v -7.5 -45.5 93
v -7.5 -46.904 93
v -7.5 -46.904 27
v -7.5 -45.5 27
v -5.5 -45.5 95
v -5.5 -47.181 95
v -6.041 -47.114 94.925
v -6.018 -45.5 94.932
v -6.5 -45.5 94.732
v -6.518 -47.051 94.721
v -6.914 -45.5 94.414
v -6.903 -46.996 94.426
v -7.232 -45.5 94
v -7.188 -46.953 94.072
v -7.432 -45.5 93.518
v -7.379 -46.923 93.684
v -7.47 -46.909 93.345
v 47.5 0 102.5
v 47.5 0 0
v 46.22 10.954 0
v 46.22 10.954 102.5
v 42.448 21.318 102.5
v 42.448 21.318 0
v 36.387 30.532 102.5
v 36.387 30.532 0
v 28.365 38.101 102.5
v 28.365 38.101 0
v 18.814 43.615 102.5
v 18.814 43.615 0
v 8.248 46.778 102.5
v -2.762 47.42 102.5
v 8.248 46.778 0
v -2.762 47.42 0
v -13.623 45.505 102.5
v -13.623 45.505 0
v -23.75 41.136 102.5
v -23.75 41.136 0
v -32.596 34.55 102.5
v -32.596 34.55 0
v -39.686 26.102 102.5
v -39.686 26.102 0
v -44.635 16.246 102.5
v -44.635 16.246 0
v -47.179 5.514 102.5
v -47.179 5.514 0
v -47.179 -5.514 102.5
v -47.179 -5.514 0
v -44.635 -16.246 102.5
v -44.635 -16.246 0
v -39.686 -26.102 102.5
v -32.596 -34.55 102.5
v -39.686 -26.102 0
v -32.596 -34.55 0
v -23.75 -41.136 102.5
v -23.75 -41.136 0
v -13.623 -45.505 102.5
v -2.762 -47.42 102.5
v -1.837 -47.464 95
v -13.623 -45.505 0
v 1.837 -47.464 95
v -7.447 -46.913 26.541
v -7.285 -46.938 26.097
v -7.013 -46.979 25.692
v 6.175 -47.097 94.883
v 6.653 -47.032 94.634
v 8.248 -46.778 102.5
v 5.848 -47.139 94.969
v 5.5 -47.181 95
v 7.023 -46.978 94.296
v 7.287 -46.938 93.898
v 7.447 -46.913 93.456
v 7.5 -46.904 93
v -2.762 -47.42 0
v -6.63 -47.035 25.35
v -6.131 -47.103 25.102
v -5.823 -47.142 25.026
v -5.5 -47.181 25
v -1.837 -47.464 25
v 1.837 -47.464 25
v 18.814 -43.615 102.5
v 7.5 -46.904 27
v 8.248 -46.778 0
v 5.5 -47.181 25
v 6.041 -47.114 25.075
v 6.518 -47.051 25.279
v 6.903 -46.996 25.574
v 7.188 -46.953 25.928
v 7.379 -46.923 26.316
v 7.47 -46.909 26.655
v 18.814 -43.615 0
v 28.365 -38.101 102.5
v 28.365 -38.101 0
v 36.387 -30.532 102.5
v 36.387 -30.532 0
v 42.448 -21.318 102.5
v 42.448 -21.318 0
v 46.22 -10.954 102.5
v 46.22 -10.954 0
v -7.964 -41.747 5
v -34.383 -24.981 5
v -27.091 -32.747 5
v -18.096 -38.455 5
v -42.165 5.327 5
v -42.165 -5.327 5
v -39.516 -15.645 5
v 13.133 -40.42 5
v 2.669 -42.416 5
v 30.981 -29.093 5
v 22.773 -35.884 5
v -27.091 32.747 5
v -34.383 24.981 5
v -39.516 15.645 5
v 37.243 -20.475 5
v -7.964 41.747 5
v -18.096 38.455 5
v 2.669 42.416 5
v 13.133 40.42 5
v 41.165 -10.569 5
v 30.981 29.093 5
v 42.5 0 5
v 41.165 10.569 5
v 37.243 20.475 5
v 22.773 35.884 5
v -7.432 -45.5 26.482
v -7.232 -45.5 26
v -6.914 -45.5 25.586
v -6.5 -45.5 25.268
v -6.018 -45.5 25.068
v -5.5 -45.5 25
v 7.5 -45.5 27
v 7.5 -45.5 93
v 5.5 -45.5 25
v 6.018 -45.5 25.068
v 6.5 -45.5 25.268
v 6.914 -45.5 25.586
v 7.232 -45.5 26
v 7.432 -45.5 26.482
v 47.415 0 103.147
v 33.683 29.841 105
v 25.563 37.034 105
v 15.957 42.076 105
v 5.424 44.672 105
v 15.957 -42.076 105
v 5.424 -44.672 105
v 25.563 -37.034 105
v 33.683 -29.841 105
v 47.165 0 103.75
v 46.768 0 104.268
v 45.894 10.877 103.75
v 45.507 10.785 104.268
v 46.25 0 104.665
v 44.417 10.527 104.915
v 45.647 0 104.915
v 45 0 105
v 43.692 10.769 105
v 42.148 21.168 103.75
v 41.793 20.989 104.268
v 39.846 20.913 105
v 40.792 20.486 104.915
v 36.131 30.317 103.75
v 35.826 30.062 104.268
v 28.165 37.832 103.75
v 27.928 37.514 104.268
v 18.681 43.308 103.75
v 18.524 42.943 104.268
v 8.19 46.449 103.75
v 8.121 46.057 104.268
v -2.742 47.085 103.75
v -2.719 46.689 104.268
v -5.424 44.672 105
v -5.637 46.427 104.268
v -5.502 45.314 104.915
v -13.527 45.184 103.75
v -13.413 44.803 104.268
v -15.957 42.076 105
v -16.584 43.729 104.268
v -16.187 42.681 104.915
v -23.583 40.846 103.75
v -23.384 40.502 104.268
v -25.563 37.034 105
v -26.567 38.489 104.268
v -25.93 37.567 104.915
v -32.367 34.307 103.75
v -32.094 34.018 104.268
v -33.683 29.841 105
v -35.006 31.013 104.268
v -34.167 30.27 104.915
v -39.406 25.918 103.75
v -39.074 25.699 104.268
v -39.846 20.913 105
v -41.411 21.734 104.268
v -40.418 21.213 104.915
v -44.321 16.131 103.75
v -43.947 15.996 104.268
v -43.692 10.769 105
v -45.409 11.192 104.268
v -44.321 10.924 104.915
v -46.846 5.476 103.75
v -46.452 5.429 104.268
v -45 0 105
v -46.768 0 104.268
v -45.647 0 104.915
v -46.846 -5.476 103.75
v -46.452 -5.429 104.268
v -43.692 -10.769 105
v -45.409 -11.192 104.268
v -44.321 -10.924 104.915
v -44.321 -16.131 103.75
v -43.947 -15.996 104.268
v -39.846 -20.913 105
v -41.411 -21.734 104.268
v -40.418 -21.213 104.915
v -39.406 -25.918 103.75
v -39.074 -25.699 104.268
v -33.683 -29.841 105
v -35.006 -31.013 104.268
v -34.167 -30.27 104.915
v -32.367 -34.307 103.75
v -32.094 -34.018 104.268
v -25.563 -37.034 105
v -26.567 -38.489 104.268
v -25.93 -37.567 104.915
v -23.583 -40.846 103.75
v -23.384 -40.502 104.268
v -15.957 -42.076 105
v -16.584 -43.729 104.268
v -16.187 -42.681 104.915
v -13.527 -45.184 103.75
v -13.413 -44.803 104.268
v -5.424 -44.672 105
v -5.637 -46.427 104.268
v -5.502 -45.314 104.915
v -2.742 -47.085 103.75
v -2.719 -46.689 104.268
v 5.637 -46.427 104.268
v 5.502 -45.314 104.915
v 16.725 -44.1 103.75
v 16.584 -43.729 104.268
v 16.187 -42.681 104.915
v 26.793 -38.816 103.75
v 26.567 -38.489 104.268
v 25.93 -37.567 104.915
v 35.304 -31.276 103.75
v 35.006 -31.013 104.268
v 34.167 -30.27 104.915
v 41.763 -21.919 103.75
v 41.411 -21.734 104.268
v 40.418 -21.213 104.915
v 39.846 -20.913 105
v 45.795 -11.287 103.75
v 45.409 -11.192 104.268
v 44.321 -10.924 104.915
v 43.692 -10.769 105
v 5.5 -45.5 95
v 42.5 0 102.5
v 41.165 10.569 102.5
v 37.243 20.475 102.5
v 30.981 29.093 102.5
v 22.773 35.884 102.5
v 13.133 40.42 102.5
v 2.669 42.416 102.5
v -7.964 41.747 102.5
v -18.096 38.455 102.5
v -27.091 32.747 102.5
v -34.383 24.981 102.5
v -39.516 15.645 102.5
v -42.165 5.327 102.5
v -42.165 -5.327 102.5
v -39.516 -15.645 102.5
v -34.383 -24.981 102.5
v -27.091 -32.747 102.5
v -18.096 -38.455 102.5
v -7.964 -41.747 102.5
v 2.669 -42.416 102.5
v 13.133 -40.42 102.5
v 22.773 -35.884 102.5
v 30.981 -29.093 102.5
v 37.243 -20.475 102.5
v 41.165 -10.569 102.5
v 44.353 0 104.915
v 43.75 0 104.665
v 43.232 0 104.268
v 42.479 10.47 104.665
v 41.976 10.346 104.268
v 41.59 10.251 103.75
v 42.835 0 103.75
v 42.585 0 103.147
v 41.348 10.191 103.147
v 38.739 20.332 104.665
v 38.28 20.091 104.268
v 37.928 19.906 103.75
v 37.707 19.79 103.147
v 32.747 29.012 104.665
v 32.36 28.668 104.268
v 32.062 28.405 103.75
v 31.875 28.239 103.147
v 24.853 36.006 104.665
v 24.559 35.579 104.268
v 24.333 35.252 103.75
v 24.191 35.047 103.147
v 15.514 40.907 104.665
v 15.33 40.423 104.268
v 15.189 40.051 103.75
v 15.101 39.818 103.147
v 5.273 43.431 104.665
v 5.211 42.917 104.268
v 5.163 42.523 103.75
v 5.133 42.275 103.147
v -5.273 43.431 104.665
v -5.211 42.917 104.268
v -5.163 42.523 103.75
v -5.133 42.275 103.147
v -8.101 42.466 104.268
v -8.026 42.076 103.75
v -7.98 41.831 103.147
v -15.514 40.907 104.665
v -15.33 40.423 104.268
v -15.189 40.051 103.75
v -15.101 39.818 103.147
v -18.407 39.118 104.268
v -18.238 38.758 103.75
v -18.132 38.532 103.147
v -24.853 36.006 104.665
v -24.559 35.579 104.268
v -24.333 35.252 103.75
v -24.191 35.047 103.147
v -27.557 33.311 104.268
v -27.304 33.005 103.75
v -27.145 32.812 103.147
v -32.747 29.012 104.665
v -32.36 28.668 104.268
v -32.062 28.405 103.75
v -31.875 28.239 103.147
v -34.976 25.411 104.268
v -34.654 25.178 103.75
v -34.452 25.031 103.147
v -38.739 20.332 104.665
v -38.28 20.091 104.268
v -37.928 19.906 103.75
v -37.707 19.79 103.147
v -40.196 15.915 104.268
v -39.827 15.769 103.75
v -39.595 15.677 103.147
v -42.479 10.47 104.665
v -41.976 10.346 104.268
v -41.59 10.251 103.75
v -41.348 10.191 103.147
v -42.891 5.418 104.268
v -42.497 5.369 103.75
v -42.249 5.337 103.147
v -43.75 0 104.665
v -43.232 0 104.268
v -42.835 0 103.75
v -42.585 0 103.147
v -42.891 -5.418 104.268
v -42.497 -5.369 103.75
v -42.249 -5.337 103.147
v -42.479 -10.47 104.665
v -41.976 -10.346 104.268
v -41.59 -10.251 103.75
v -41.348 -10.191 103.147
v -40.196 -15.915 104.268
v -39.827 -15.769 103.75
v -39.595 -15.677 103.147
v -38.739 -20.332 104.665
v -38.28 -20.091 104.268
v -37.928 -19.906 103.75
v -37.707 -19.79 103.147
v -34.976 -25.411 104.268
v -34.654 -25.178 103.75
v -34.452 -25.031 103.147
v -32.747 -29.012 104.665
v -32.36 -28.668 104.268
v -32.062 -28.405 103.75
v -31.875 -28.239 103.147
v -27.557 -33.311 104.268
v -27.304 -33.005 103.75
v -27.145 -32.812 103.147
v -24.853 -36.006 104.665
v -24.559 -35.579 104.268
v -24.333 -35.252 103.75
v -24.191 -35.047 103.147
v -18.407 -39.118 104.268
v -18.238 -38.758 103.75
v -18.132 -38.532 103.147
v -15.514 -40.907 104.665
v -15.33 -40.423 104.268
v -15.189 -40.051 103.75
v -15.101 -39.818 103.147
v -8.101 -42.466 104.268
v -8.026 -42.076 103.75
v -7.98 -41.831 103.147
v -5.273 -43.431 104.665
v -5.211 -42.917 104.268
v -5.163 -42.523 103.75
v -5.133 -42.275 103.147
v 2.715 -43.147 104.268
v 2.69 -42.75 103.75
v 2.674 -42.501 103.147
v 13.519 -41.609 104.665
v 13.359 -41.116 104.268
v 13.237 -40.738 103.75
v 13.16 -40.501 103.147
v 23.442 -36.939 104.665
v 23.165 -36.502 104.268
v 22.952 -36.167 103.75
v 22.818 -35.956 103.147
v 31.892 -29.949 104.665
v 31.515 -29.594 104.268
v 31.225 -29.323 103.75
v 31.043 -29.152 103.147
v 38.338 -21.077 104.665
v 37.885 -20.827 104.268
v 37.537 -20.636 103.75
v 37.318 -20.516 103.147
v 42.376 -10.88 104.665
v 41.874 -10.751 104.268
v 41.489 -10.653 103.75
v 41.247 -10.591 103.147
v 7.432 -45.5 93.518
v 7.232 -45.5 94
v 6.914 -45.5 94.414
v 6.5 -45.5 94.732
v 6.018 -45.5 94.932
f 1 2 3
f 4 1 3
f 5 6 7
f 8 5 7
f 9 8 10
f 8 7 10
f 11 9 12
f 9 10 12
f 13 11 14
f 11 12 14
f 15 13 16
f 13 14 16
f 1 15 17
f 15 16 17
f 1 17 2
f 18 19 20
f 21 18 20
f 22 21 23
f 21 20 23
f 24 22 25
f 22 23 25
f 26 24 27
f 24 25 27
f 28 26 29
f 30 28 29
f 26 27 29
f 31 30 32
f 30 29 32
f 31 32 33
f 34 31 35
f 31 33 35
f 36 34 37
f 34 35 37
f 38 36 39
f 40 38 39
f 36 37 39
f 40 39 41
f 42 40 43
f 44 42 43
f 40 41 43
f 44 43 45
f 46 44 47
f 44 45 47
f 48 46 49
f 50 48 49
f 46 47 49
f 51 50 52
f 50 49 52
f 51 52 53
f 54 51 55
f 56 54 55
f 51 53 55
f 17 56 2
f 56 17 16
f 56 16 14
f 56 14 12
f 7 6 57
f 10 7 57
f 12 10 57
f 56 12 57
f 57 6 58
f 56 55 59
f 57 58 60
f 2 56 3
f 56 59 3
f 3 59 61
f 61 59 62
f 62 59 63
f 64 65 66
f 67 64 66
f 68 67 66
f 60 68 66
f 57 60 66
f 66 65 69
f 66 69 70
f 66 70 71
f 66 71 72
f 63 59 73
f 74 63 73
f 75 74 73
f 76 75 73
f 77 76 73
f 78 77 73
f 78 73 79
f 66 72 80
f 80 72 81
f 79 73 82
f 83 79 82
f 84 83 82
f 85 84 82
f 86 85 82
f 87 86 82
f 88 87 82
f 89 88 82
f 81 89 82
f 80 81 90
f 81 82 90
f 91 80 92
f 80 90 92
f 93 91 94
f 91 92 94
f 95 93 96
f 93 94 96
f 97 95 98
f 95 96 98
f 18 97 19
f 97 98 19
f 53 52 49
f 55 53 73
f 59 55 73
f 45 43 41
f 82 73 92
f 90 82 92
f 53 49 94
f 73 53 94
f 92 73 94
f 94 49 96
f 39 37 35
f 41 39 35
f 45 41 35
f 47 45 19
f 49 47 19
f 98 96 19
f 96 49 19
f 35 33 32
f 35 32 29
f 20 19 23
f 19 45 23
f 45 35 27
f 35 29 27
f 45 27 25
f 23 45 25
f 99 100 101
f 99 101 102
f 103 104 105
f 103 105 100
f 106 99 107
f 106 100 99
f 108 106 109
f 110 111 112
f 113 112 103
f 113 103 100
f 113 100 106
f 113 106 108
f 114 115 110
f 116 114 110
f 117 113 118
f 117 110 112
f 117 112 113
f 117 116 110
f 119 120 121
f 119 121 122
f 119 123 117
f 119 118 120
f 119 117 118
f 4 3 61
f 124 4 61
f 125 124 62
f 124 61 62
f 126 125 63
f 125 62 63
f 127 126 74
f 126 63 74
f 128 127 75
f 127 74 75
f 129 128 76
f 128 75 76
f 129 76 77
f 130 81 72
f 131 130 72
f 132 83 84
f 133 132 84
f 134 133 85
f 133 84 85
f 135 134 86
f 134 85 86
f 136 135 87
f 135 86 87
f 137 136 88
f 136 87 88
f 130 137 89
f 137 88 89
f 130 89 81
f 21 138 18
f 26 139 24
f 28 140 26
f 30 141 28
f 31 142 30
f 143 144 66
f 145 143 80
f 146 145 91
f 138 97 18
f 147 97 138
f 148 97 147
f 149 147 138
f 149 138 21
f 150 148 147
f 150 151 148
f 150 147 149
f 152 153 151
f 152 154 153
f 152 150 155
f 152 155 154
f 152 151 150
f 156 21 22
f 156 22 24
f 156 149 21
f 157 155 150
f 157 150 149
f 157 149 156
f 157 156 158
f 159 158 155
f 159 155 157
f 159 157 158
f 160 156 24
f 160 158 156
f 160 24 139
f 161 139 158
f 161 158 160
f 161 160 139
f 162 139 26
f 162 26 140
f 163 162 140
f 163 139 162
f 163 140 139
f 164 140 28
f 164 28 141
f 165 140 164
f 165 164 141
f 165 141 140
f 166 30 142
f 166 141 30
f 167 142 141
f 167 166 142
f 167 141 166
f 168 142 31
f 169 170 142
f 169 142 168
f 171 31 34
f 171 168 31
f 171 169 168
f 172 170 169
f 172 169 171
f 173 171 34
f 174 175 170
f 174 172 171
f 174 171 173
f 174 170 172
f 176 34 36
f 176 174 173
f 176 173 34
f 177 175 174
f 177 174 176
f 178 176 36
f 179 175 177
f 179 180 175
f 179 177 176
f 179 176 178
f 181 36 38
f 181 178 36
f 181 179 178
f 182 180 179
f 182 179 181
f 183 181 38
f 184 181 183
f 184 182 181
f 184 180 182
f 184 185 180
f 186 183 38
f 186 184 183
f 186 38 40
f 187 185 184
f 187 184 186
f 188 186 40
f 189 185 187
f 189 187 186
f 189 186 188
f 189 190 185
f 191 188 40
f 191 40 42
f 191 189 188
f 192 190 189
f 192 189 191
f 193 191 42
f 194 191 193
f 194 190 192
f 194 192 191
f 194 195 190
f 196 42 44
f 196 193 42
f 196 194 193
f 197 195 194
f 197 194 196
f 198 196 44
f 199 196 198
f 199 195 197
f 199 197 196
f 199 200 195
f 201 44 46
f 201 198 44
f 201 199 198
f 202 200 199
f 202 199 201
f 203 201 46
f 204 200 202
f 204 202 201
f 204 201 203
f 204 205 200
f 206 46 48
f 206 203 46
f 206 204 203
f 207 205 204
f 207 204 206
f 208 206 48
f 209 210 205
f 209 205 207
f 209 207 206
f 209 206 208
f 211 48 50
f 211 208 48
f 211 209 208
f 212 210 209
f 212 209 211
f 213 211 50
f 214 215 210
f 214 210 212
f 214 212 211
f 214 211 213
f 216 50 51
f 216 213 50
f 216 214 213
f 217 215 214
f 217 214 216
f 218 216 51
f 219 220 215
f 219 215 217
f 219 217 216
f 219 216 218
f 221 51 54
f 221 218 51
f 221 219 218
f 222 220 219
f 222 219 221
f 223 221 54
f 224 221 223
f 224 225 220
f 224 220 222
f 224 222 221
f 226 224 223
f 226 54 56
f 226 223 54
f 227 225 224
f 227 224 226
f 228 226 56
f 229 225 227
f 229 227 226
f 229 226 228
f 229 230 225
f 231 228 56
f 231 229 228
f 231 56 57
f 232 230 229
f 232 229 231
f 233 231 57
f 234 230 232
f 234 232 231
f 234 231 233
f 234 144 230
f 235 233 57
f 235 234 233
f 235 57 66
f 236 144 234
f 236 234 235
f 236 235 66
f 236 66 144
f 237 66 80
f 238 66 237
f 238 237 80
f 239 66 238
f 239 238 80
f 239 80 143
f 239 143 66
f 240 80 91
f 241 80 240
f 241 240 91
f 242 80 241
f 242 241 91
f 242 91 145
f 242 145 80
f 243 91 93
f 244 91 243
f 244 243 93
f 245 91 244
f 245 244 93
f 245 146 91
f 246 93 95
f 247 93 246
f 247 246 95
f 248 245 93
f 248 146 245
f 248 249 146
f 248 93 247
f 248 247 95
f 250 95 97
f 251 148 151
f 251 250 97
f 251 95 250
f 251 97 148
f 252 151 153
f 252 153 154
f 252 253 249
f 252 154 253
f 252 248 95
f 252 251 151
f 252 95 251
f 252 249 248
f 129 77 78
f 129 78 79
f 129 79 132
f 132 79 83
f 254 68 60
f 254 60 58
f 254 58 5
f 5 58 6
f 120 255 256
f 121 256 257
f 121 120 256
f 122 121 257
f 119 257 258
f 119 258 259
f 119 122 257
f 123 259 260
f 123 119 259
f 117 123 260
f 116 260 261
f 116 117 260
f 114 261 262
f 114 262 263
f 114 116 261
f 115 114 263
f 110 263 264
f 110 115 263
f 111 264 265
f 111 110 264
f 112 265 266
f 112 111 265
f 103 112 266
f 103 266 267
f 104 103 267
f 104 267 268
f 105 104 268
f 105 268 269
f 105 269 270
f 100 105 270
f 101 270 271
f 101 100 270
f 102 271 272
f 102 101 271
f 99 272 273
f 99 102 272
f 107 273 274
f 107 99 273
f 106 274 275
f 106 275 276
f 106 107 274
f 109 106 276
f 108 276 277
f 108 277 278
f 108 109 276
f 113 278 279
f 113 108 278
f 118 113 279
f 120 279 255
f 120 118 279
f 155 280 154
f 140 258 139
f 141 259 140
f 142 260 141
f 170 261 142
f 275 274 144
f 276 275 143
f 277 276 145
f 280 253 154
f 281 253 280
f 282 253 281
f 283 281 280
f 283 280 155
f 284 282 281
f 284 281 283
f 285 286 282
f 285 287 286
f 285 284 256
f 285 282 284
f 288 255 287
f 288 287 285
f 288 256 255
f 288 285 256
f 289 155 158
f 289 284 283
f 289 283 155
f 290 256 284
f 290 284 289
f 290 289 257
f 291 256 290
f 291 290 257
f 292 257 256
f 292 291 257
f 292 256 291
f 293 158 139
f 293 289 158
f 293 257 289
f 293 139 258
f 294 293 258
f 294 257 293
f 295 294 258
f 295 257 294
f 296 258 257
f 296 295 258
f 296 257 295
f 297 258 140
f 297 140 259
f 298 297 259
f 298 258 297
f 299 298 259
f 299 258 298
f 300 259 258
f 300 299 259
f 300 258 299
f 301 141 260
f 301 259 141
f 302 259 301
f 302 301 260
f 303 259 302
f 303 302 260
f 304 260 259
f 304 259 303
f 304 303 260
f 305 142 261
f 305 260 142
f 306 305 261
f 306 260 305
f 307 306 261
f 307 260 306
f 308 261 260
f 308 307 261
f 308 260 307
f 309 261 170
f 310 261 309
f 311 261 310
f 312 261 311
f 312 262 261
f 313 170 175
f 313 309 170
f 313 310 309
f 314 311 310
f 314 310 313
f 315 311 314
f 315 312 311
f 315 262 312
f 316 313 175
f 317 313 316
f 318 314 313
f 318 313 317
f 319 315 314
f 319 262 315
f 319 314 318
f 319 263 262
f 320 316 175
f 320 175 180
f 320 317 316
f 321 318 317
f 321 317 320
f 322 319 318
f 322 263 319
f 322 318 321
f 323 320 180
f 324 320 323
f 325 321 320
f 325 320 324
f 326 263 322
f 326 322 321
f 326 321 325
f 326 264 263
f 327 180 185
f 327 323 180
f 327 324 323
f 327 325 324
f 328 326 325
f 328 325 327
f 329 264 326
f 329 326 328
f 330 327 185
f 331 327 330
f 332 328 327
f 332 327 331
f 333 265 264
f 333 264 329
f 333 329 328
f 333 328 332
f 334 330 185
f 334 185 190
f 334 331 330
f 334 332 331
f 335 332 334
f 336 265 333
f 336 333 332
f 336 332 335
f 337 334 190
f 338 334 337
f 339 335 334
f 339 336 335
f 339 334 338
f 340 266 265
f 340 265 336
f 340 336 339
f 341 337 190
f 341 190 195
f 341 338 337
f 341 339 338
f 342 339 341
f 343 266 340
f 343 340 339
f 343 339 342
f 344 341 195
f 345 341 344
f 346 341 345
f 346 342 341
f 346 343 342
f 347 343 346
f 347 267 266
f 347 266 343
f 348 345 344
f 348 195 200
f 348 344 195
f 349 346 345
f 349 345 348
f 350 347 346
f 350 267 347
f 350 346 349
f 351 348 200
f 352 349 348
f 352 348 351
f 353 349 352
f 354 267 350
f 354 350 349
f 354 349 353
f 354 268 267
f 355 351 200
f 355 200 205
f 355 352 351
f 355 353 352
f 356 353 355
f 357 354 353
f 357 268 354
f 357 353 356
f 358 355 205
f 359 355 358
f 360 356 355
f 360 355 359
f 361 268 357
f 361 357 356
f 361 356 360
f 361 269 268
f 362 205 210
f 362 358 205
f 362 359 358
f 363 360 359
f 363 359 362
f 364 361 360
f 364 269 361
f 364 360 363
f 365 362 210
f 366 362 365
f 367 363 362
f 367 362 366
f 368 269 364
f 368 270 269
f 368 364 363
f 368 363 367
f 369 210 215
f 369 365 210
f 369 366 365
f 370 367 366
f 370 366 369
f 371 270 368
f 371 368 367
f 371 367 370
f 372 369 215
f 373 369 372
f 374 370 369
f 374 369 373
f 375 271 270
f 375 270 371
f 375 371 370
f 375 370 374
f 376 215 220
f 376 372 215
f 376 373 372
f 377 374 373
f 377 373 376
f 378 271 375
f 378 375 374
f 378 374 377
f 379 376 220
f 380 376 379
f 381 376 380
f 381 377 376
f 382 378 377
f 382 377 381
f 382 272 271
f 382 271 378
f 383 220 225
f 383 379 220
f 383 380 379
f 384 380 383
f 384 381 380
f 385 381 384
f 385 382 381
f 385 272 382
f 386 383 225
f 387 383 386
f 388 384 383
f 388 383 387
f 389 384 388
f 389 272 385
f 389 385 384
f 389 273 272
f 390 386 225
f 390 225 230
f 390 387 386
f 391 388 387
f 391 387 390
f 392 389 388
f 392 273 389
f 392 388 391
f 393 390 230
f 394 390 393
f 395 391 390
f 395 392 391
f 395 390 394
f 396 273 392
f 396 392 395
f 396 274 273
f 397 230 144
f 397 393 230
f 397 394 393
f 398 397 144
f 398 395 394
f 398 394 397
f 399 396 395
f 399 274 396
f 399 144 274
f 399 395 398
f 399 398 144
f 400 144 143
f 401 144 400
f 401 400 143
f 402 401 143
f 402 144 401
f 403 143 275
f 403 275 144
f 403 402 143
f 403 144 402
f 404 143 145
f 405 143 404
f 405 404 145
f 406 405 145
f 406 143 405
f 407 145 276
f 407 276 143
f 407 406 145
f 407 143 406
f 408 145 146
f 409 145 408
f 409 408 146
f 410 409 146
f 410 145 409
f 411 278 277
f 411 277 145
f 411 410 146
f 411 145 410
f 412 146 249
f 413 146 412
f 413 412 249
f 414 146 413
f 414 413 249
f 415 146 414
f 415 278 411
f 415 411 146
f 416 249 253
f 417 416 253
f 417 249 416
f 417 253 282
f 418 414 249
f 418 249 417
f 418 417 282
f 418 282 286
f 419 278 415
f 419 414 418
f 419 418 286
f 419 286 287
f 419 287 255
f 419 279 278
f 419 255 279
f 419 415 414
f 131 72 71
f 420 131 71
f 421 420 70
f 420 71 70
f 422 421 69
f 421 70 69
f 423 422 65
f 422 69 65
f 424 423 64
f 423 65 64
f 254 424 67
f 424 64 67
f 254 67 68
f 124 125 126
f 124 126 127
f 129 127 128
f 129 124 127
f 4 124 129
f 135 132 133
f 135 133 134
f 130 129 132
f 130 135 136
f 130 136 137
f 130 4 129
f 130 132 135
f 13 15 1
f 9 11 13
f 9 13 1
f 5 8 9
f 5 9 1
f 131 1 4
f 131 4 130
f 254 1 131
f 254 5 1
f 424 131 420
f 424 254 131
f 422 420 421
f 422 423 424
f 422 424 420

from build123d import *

# Parameters (mm, degrees)
F0_R     = 47.5
F1_DEPTH = 5
F2_R     = 47.5
F2_R_2   = 42.5
F3_DEPTH = 100
F6_DEPTH = 2
F8_R     = 2.49999


# Not quite as in the source:
# - a fillet or chamfer is up to 0.001 mm smaller than in the source, because OpenCascade refuses the exact size


with BuildPart() as f1:
    # F0 (on Top) → F1 (new body)
    with BuildSketch(Plane.XY):
        Circle(F0_R)
    extrude(amount=F1_DEPTH)

    # F2 (on face) → F3 (join)
    with BuildSketch(Plane.XY.offset(5)):
        Circle(F2_R)
        Circle(F2_R_2, mode=Mode.SUBTRACT)
    extrude(amount=F3_DEPTH)

    # F5 (on offset) → F6 (cut)
    with BuildSketch(Plane.XZ.offset(47.5)):
        with BuildLine():
            ThreePointArc((7.5, 93), (6.9142135624, 94.4142135624), (5.5, 95))
            Line((5.5, 95), (-5.5, 95))
            ThreePointArc((-5.5, 95), (-6.9142135624, 94.4142135624), (-7.5, 93))
            Line((-7.5, 93), (-7.5, 27))
            ThreePointArc((-7.5, 27), (-6.9142135624, 25.5857864376), (-5.5, 25))
            Line((-5.5, 25), (5.5, 25))
            ThreePointArc((5.5, 25), (6.9142135624, 25.5857864376), (7.5, 27))
            Line((7.5, 27), (7.5, 93))
        make_face()
    extrude(amount=-F6_DEPTH, mode=Mode.SUBTRACT)

    # F8 (radius 2.5 in the source; OpenCascade refuses exactly that, so slightly less here)
    f8_edges = [f1.edges().sort_by_distance(p)[0] for p in [
        (-47.5, 0, 105),
        (-42.5, 0, 105),
    ]]
    fillet(f8_edges, radius=F8_R)


solid = f1.part
